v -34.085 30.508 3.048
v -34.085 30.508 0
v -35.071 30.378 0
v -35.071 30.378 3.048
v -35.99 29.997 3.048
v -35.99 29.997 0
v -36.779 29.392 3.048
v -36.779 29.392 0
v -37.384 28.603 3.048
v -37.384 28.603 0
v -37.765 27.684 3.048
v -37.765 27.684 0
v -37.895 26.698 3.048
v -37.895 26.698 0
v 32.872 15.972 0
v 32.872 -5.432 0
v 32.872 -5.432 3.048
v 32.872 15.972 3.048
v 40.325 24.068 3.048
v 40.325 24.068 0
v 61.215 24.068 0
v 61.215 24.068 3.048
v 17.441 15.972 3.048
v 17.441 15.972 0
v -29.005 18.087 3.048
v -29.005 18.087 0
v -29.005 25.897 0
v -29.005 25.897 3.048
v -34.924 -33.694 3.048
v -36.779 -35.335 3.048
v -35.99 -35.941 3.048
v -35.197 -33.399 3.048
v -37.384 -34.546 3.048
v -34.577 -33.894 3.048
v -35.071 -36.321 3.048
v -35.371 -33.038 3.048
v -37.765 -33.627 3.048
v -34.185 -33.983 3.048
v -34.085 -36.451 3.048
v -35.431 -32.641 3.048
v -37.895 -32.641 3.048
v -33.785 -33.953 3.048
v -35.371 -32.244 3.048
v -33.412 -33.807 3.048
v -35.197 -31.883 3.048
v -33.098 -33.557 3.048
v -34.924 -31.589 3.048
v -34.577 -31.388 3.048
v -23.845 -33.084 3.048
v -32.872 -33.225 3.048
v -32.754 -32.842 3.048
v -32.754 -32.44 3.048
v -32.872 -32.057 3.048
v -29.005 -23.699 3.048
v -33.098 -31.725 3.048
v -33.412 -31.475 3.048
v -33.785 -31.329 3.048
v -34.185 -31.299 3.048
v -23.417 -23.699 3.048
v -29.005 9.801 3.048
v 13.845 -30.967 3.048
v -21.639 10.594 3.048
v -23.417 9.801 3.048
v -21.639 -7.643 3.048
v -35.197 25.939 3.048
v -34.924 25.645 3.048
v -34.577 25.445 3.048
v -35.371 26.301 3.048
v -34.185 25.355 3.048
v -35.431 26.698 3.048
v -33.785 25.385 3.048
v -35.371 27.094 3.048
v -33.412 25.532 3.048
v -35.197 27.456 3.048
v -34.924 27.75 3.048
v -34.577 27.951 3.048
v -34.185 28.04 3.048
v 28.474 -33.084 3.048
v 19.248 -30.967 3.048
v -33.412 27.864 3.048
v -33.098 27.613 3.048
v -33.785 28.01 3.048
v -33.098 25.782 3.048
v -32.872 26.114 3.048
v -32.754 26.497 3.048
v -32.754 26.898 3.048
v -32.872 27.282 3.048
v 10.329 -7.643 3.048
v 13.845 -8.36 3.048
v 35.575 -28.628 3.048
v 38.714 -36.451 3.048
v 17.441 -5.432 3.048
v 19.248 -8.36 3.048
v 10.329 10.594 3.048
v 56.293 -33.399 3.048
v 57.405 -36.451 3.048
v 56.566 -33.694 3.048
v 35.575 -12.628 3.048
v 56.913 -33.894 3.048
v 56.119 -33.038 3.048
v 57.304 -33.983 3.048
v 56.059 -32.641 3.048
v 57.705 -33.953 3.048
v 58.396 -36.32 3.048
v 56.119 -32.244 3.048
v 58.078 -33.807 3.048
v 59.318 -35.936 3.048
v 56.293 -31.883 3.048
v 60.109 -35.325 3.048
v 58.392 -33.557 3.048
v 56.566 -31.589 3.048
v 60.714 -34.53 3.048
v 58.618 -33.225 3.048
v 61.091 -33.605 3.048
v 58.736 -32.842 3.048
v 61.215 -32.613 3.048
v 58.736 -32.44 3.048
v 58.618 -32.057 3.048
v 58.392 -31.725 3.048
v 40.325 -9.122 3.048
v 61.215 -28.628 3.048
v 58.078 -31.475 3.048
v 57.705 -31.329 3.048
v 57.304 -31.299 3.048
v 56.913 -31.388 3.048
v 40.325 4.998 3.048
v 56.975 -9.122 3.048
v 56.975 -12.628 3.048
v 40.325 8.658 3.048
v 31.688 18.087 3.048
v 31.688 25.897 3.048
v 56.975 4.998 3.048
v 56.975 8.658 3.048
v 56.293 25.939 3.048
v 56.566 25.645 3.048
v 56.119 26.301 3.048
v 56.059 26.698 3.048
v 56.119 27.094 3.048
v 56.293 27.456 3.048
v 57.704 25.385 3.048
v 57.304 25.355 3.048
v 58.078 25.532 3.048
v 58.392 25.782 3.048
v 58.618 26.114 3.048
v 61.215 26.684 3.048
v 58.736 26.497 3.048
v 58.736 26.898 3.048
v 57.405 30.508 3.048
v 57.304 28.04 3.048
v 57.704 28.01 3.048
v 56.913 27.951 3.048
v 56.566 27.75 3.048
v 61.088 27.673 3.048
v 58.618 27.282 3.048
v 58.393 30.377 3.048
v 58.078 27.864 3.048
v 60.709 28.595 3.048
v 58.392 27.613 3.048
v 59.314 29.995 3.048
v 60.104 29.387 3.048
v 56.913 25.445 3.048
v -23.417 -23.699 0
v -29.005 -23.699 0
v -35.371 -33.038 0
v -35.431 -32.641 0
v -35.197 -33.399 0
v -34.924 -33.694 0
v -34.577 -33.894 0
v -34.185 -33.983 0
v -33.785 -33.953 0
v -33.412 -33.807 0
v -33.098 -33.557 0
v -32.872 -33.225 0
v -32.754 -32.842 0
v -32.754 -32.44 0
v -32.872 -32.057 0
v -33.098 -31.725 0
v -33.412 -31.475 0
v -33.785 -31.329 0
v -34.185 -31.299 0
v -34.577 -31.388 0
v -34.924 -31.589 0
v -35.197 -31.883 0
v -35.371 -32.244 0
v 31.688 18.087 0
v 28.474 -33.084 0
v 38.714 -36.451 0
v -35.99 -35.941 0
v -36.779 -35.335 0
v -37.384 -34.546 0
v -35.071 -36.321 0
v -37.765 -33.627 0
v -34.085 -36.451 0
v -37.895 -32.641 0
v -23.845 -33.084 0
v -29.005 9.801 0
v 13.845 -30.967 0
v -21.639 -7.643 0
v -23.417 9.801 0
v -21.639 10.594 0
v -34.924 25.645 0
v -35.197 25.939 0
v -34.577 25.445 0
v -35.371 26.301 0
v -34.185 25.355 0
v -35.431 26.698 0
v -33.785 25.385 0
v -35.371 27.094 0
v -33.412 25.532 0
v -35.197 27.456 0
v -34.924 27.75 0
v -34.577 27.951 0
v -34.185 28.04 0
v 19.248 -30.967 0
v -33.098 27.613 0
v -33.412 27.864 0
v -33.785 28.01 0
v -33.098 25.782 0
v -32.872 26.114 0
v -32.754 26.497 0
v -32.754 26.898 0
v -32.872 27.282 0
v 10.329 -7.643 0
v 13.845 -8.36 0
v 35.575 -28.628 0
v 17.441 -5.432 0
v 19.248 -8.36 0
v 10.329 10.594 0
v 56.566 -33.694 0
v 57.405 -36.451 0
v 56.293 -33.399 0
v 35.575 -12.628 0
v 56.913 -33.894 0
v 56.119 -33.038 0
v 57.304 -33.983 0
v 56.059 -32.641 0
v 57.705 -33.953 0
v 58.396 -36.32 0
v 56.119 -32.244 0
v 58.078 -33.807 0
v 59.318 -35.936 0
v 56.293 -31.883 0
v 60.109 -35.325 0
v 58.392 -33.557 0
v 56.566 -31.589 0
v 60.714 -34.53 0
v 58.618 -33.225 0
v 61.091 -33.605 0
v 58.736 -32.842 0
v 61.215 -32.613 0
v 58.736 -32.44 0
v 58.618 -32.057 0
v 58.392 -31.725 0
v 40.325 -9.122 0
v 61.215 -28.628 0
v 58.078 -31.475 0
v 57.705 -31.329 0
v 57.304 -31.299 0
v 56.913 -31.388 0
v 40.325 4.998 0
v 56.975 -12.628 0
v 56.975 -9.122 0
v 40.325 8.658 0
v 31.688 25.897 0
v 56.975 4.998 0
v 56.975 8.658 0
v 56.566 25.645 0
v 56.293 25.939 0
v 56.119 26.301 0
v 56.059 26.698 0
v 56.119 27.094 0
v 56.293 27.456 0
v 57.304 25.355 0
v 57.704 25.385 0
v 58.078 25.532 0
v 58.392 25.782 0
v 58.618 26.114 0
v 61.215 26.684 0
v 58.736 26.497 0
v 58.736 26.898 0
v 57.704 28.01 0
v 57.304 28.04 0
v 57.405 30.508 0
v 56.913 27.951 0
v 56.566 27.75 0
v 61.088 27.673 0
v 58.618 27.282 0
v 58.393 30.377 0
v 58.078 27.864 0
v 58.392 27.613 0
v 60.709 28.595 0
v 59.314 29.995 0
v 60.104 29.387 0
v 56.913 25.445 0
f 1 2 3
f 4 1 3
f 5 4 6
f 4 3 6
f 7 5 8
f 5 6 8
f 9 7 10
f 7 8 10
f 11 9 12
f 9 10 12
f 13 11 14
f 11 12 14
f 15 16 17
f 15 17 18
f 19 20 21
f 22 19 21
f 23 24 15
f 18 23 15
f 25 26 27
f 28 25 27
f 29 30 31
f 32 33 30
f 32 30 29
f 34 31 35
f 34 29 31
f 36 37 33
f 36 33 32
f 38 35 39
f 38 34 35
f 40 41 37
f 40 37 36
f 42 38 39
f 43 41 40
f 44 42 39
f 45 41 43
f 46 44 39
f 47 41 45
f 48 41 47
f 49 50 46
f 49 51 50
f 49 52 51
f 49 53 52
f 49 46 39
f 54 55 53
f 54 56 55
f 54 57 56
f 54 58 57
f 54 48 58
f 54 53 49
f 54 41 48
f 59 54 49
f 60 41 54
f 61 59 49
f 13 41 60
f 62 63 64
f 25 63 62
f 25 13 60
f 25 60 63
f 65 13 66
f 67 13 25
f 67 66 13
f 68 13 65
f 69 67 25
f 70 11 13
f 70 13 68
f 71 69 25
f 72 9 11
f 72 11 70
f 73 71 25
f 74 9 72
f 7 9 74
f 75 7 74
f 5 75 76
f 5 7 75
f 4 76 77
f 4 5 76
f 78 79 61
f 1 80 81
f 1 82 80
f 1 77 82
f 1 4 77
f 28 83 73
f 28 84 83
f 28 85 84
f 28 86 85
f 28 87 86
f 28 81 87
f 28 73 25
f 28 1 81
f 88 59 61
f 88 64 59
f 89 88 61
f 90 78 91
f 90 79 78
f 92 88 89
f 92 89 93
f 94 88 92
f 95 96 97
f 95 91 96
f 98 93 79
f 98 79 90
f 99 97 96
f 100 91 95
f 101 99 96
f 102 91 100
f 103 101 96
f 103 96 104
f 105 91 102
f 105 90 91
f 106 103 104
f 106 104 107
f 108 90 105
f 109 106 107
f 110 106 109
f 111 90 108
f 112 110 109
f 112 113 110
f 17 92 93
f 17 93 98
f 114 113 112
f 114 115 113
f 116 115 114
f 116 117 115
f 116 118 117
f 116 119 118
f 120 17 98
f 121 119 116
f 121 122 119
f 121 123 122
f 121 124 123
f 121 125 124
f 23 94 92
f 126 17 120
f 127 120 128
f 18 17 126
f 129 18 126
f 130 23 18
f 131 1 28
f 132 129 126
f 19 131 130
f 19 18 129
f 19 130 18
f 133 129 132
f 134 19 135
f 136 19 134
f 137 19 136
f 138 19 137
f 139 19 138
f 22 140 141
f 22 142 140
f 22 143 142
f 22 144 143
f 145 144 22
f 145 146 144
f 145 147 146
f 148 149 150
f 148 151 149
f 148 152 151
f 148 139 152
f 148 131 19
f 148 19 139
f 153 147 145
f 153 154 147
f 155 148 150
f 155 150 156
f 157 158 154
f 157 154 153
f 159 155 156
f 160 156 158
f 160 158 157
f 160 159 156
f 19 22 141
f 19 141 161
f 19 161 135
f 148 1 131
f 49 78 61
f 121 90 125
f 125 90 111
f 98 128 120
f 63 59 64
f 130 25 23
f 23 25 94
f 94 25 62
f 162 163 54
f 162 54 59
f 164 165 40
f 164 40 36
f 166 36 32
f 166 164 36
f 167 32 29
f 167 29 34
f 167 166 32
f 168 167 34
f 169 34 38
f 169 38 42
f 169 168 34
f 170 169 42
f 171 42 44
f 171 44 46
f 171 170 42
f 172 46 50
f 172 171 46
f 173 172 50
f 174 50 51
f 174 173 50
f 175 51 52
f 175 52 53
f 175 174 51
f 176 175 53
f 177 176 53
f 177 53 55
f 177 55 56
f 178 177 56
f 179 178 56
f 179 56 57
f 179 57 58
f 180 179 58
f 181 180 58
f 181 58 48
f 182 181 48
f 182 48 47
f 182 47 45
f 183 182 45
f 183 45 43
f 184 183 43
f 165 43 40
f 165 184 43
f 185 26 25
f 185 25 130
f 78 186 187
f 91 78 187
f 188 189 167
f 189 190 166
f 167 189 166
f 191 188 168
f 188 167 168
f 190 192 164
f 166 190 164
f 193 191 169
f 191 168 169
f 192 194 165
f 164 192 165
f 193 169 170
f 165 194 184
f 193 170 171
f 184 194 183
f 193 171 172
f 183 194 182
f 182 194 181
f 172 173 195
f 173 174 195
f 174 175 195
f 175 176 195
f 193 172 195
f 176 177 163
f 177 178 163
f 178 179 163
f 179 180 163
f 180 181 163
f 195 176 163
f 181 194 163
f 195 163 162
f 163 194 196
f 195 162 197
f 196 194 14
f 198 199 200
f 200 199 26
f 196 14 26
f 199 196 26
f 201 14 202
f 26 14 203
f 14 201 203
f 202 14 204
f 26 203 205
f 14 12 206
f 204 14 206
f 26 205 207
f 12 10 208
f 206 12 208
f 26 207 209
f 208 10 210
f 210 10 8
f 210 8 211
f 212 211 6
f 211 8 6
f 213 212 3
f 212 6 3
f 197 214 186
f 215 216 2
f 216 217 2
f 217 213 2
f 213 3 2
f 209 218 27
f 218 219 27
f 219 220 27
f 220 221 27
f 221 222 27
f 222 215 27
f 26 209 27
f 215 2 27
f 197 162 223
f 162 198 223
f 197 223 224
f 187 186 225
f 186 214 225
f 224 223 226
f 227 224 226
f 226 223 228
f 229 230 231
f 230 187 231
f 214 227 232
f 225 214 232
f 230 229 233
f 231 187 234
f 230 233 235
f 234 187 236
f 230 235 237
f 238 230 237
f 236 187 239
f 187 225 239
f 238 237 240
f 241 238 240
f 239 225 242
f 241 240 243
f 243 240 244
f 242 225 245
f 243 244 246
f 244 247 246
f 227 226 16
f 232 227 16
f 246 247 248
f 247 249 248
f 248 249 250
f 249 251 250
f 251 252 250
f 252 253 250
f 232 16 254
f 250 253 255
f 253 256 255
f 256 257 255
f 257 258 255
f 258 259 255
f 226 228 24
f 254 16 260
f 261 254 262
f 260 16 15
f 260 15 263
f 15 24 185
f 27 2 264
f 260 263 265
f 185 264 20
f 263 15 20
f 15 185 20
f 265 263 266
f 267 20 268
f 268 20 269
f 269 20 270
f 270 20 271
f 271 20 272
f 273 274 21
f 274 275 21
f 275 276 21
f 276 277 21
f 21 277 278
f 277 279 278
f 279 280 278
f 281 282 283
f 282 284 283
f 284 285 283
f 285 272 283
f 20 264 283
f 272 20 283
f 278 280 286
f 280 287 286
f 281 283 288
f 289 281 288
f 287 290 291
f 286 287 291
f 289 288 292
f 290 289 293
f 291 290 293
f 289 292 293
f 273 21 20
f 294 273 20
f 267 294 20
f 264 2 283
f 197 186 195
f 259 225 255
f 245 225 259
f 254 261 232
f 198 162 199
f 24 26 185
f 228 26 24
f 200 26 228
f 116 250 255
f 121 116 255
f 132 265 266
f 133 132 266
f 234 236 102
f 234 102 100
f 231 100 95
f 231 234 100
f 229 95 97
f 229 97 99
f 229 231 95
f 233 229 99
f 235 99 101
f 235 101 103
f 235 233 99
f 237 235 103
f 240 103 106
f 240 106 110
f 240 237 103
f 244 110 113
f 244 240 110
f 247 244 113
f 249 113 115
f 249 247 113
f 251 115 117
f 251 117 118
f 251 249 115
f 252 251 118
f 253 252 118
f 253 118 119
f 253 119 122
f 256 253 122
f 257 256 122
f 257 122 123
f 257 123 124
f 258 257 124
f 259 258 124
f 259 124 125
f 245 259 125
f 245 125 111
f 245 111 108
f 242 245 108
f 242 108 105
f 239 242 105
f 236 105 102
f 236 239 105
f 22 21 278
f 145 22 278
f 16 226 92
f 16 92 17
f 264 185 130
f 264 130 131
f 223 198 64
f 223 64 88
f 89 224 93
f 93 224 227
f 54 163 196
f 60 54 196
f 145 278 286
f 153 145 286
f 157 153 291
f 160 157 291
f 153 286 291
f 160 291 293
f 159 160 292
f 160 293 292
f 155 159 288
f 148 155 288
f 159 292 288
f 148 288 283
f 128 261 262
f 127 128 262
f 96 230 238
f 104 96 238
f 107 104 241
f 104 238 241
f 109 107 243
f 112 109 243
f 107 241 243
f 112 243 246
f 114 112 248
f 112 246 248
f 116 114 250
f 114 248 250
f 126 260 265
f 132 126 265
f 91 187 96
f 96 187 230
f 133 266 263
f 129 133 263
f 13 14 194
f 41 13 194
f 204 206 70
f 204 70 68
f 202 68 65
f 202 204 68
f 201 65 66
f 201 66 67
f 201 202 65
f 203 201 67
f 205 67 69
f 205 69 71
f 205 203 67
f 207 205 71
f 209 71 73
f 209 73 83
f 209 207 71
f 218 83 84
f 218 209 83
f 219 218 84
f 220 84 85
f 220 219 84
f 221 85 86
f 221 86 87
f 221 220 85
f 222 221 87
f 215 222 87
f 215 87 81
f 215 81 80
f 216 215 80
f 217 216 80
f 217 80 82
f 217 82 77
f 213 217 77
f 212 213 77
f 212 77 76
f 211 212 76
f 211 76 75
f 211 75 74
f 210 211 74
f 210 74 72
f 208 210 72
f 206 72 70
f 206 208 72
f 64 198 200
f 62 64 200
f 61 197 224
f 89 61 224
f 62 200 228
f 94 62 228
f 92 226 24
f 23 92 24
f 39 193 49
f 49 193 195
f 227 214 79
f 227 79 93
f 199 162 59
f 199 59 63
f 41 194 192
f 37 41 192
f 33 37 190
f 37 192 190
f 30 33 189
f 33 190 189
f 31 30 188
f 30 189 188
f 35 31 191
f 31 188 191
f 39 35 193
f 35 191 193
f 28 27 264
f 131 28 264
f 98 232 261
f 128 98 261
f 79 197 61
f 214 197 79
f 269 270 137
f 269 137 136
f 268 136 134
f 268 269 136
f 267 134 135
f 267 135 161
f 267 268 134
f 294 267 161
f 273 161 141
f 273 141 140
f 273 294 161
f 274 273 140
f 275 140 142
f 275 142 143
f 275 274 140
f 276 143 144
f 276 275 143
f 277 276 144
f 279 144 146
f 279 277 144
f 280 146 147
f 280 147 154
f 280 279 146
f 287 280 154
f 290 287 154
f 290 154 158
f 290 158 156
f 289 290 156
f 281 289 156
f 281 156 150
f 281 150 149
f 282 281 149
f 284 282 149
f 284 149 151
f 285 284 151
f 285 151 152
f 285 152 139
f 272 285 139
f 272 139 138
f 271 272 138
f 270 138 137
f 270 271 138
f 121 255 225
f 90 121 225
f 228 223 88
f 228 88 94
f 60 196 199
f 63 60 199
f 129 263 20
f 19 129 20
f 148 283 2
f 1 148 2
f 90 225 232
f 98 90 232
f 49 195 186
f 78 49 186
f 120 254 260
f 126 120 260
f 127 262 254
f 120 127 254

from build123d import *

# Parameters (mm, degrees)
SKETCH1_R           = 1.3462
SKETCH1_W           = 5.4034
SKETCH1_H           = 22.6066
SKETCH1_W_2         = 60.6932
SKETCH1_H_2         = 7.81
SKETCH1_W_3         = 15.431
SKETCH1_H_3         = 21.4039
SKETCH1_W_4         = 31.9679
SKETCH1_H_4         = 18.2371
SKETCH1_W_5         = 5.588
SKETCH1_H_5         = 33.5001
BOSS_EXTRUDE1_DEPTH = 3.048


with BuildPart() as part:
    # Sketch1 → Boss-Extrude1 (new body)
    with BuildSketch(Plane.XY):
        with BuildLine():
            Line((40.325007375, 24.068294304), (61.214907375, 24.068294304))
            Line((61.214907375, 24.068294304), (61.214907375, 26.683892153))
            ThreePointArc((61.214907375, 26.683892153), (60.103884597, 29.386886916), (57.404932375, 30.507694304))
            Line((57.404932375, 30.507694304), (-34.084892625, 30.507694304))
            ThreePointArc((-34.084892625, 30.507694304), (-36.778969461, 29.391771141), (-37.894892625, 26.697694304))
            Line((-37.894892625, 26.697694304), (-37.894892625, -32.641005696))
            ThreePointArc((-37.894892625, -32.641005696), (-36.778969461, -35.335082532), (-34.084892625, -36.451005696))
            Line((-34.084892625, -36.451005696), (-23.844892625, -33.084405696))
            Line((-23.844892625, -33.084405696), (28.474307375, -33.084405696))
            Line((28.474307375, -33.084405696), (38.714307375, -36.451005696))
            Line((38.714307375, -36.451005696), (57.405007375, -36.451005696))
            ThreePointArc((57.405007375, -36.451005696), (60.108826144, -35.325305244), (61.214907375, -32.613401529))
            Line((61.214907375, -32.613401529), (61.214907375, -28.627805696))
            Line((61.214907375, -28.627805696), (35.575007375, -28.627805696))
            Line((35.575007375, -28.627805696), (35.575007375, -12.628005696))
            Line((35.575007375, -12.628005696), (56.975007375, -12.628005696))
            Line((56.975007375, -12.628005696), (56.975007375, -9.121805696))
            Line((56.975007375, -9.121805696), (40.325007375, -9.121805696))
            Line((40.325007375, -9.121805696), (40.325007375, 4.997894304))
            Line((40.325007375, 4.997894304), (56.975007375, 4.997894304))
            Line((56.975007375, 4.997894304), (56.975007375, 8.658194304))
            Line((56.975007375, 8.658194304), (40.325007375, 8.658194304))
            Line((40.325007375, 8.658194304), (40.325007375, 24.068294304))
        make_face()
        with Locations(Location((57.404932375, 26.697694304, 0), (0, 0, 180))):
            Circle(SKETCH1_R, mode=Mode.SUBTRACT)
        with Locations(Location((57.405007375, -32.641005696, 0), (0, 0, 180))):
            Circle(SKETCH1_R, mode=Mode.SUBTRACT)
        with Locations(Location((-34.084892625, -32.641005696, 0), (0, 0, 180))):
            Circle(SKETCH1_R, mode=Mode.SUBTRACT)
        with Locations(Location((-34.084892625, 26.697694304, 0), (0, 0, 180))):
            Circle(SKETCH1_R, mode=Mode.SUBTRACT)
        with Locations((16.546707375, -19.663505696)):
            Rectangle(SKETCH1_W, SKETCH1_H, mode=Mode.SUBTRACT)
        with Locations((1.341707375, 21.991994304)):
            Rectangle(SKETCH1_W_2, SKETCH1_H_2, mode=Mode.SUBTRACT)
        with Locations((25.156507375, 5.270444304)):
            Rectangle(SKETCH1_W_3, SKETCH1_H_3, mode=Mode.SUBTRACT)
        with Locations((-5.654942625, 1.475544304)):
            Rectangle(SKETCH1_W_4, SKETCH1_H_4, mode=Mode.SUBTRACT)
        with Locations((-26.210892625, -6.948855696)):
            Rectangle(SKETCH1_W_5, SKETCH1_H_5, mode=Mode.SUBTRACT)
    extrude(amount=BOSS_EXTRUDE1_DEPTH)


solid = part.part
